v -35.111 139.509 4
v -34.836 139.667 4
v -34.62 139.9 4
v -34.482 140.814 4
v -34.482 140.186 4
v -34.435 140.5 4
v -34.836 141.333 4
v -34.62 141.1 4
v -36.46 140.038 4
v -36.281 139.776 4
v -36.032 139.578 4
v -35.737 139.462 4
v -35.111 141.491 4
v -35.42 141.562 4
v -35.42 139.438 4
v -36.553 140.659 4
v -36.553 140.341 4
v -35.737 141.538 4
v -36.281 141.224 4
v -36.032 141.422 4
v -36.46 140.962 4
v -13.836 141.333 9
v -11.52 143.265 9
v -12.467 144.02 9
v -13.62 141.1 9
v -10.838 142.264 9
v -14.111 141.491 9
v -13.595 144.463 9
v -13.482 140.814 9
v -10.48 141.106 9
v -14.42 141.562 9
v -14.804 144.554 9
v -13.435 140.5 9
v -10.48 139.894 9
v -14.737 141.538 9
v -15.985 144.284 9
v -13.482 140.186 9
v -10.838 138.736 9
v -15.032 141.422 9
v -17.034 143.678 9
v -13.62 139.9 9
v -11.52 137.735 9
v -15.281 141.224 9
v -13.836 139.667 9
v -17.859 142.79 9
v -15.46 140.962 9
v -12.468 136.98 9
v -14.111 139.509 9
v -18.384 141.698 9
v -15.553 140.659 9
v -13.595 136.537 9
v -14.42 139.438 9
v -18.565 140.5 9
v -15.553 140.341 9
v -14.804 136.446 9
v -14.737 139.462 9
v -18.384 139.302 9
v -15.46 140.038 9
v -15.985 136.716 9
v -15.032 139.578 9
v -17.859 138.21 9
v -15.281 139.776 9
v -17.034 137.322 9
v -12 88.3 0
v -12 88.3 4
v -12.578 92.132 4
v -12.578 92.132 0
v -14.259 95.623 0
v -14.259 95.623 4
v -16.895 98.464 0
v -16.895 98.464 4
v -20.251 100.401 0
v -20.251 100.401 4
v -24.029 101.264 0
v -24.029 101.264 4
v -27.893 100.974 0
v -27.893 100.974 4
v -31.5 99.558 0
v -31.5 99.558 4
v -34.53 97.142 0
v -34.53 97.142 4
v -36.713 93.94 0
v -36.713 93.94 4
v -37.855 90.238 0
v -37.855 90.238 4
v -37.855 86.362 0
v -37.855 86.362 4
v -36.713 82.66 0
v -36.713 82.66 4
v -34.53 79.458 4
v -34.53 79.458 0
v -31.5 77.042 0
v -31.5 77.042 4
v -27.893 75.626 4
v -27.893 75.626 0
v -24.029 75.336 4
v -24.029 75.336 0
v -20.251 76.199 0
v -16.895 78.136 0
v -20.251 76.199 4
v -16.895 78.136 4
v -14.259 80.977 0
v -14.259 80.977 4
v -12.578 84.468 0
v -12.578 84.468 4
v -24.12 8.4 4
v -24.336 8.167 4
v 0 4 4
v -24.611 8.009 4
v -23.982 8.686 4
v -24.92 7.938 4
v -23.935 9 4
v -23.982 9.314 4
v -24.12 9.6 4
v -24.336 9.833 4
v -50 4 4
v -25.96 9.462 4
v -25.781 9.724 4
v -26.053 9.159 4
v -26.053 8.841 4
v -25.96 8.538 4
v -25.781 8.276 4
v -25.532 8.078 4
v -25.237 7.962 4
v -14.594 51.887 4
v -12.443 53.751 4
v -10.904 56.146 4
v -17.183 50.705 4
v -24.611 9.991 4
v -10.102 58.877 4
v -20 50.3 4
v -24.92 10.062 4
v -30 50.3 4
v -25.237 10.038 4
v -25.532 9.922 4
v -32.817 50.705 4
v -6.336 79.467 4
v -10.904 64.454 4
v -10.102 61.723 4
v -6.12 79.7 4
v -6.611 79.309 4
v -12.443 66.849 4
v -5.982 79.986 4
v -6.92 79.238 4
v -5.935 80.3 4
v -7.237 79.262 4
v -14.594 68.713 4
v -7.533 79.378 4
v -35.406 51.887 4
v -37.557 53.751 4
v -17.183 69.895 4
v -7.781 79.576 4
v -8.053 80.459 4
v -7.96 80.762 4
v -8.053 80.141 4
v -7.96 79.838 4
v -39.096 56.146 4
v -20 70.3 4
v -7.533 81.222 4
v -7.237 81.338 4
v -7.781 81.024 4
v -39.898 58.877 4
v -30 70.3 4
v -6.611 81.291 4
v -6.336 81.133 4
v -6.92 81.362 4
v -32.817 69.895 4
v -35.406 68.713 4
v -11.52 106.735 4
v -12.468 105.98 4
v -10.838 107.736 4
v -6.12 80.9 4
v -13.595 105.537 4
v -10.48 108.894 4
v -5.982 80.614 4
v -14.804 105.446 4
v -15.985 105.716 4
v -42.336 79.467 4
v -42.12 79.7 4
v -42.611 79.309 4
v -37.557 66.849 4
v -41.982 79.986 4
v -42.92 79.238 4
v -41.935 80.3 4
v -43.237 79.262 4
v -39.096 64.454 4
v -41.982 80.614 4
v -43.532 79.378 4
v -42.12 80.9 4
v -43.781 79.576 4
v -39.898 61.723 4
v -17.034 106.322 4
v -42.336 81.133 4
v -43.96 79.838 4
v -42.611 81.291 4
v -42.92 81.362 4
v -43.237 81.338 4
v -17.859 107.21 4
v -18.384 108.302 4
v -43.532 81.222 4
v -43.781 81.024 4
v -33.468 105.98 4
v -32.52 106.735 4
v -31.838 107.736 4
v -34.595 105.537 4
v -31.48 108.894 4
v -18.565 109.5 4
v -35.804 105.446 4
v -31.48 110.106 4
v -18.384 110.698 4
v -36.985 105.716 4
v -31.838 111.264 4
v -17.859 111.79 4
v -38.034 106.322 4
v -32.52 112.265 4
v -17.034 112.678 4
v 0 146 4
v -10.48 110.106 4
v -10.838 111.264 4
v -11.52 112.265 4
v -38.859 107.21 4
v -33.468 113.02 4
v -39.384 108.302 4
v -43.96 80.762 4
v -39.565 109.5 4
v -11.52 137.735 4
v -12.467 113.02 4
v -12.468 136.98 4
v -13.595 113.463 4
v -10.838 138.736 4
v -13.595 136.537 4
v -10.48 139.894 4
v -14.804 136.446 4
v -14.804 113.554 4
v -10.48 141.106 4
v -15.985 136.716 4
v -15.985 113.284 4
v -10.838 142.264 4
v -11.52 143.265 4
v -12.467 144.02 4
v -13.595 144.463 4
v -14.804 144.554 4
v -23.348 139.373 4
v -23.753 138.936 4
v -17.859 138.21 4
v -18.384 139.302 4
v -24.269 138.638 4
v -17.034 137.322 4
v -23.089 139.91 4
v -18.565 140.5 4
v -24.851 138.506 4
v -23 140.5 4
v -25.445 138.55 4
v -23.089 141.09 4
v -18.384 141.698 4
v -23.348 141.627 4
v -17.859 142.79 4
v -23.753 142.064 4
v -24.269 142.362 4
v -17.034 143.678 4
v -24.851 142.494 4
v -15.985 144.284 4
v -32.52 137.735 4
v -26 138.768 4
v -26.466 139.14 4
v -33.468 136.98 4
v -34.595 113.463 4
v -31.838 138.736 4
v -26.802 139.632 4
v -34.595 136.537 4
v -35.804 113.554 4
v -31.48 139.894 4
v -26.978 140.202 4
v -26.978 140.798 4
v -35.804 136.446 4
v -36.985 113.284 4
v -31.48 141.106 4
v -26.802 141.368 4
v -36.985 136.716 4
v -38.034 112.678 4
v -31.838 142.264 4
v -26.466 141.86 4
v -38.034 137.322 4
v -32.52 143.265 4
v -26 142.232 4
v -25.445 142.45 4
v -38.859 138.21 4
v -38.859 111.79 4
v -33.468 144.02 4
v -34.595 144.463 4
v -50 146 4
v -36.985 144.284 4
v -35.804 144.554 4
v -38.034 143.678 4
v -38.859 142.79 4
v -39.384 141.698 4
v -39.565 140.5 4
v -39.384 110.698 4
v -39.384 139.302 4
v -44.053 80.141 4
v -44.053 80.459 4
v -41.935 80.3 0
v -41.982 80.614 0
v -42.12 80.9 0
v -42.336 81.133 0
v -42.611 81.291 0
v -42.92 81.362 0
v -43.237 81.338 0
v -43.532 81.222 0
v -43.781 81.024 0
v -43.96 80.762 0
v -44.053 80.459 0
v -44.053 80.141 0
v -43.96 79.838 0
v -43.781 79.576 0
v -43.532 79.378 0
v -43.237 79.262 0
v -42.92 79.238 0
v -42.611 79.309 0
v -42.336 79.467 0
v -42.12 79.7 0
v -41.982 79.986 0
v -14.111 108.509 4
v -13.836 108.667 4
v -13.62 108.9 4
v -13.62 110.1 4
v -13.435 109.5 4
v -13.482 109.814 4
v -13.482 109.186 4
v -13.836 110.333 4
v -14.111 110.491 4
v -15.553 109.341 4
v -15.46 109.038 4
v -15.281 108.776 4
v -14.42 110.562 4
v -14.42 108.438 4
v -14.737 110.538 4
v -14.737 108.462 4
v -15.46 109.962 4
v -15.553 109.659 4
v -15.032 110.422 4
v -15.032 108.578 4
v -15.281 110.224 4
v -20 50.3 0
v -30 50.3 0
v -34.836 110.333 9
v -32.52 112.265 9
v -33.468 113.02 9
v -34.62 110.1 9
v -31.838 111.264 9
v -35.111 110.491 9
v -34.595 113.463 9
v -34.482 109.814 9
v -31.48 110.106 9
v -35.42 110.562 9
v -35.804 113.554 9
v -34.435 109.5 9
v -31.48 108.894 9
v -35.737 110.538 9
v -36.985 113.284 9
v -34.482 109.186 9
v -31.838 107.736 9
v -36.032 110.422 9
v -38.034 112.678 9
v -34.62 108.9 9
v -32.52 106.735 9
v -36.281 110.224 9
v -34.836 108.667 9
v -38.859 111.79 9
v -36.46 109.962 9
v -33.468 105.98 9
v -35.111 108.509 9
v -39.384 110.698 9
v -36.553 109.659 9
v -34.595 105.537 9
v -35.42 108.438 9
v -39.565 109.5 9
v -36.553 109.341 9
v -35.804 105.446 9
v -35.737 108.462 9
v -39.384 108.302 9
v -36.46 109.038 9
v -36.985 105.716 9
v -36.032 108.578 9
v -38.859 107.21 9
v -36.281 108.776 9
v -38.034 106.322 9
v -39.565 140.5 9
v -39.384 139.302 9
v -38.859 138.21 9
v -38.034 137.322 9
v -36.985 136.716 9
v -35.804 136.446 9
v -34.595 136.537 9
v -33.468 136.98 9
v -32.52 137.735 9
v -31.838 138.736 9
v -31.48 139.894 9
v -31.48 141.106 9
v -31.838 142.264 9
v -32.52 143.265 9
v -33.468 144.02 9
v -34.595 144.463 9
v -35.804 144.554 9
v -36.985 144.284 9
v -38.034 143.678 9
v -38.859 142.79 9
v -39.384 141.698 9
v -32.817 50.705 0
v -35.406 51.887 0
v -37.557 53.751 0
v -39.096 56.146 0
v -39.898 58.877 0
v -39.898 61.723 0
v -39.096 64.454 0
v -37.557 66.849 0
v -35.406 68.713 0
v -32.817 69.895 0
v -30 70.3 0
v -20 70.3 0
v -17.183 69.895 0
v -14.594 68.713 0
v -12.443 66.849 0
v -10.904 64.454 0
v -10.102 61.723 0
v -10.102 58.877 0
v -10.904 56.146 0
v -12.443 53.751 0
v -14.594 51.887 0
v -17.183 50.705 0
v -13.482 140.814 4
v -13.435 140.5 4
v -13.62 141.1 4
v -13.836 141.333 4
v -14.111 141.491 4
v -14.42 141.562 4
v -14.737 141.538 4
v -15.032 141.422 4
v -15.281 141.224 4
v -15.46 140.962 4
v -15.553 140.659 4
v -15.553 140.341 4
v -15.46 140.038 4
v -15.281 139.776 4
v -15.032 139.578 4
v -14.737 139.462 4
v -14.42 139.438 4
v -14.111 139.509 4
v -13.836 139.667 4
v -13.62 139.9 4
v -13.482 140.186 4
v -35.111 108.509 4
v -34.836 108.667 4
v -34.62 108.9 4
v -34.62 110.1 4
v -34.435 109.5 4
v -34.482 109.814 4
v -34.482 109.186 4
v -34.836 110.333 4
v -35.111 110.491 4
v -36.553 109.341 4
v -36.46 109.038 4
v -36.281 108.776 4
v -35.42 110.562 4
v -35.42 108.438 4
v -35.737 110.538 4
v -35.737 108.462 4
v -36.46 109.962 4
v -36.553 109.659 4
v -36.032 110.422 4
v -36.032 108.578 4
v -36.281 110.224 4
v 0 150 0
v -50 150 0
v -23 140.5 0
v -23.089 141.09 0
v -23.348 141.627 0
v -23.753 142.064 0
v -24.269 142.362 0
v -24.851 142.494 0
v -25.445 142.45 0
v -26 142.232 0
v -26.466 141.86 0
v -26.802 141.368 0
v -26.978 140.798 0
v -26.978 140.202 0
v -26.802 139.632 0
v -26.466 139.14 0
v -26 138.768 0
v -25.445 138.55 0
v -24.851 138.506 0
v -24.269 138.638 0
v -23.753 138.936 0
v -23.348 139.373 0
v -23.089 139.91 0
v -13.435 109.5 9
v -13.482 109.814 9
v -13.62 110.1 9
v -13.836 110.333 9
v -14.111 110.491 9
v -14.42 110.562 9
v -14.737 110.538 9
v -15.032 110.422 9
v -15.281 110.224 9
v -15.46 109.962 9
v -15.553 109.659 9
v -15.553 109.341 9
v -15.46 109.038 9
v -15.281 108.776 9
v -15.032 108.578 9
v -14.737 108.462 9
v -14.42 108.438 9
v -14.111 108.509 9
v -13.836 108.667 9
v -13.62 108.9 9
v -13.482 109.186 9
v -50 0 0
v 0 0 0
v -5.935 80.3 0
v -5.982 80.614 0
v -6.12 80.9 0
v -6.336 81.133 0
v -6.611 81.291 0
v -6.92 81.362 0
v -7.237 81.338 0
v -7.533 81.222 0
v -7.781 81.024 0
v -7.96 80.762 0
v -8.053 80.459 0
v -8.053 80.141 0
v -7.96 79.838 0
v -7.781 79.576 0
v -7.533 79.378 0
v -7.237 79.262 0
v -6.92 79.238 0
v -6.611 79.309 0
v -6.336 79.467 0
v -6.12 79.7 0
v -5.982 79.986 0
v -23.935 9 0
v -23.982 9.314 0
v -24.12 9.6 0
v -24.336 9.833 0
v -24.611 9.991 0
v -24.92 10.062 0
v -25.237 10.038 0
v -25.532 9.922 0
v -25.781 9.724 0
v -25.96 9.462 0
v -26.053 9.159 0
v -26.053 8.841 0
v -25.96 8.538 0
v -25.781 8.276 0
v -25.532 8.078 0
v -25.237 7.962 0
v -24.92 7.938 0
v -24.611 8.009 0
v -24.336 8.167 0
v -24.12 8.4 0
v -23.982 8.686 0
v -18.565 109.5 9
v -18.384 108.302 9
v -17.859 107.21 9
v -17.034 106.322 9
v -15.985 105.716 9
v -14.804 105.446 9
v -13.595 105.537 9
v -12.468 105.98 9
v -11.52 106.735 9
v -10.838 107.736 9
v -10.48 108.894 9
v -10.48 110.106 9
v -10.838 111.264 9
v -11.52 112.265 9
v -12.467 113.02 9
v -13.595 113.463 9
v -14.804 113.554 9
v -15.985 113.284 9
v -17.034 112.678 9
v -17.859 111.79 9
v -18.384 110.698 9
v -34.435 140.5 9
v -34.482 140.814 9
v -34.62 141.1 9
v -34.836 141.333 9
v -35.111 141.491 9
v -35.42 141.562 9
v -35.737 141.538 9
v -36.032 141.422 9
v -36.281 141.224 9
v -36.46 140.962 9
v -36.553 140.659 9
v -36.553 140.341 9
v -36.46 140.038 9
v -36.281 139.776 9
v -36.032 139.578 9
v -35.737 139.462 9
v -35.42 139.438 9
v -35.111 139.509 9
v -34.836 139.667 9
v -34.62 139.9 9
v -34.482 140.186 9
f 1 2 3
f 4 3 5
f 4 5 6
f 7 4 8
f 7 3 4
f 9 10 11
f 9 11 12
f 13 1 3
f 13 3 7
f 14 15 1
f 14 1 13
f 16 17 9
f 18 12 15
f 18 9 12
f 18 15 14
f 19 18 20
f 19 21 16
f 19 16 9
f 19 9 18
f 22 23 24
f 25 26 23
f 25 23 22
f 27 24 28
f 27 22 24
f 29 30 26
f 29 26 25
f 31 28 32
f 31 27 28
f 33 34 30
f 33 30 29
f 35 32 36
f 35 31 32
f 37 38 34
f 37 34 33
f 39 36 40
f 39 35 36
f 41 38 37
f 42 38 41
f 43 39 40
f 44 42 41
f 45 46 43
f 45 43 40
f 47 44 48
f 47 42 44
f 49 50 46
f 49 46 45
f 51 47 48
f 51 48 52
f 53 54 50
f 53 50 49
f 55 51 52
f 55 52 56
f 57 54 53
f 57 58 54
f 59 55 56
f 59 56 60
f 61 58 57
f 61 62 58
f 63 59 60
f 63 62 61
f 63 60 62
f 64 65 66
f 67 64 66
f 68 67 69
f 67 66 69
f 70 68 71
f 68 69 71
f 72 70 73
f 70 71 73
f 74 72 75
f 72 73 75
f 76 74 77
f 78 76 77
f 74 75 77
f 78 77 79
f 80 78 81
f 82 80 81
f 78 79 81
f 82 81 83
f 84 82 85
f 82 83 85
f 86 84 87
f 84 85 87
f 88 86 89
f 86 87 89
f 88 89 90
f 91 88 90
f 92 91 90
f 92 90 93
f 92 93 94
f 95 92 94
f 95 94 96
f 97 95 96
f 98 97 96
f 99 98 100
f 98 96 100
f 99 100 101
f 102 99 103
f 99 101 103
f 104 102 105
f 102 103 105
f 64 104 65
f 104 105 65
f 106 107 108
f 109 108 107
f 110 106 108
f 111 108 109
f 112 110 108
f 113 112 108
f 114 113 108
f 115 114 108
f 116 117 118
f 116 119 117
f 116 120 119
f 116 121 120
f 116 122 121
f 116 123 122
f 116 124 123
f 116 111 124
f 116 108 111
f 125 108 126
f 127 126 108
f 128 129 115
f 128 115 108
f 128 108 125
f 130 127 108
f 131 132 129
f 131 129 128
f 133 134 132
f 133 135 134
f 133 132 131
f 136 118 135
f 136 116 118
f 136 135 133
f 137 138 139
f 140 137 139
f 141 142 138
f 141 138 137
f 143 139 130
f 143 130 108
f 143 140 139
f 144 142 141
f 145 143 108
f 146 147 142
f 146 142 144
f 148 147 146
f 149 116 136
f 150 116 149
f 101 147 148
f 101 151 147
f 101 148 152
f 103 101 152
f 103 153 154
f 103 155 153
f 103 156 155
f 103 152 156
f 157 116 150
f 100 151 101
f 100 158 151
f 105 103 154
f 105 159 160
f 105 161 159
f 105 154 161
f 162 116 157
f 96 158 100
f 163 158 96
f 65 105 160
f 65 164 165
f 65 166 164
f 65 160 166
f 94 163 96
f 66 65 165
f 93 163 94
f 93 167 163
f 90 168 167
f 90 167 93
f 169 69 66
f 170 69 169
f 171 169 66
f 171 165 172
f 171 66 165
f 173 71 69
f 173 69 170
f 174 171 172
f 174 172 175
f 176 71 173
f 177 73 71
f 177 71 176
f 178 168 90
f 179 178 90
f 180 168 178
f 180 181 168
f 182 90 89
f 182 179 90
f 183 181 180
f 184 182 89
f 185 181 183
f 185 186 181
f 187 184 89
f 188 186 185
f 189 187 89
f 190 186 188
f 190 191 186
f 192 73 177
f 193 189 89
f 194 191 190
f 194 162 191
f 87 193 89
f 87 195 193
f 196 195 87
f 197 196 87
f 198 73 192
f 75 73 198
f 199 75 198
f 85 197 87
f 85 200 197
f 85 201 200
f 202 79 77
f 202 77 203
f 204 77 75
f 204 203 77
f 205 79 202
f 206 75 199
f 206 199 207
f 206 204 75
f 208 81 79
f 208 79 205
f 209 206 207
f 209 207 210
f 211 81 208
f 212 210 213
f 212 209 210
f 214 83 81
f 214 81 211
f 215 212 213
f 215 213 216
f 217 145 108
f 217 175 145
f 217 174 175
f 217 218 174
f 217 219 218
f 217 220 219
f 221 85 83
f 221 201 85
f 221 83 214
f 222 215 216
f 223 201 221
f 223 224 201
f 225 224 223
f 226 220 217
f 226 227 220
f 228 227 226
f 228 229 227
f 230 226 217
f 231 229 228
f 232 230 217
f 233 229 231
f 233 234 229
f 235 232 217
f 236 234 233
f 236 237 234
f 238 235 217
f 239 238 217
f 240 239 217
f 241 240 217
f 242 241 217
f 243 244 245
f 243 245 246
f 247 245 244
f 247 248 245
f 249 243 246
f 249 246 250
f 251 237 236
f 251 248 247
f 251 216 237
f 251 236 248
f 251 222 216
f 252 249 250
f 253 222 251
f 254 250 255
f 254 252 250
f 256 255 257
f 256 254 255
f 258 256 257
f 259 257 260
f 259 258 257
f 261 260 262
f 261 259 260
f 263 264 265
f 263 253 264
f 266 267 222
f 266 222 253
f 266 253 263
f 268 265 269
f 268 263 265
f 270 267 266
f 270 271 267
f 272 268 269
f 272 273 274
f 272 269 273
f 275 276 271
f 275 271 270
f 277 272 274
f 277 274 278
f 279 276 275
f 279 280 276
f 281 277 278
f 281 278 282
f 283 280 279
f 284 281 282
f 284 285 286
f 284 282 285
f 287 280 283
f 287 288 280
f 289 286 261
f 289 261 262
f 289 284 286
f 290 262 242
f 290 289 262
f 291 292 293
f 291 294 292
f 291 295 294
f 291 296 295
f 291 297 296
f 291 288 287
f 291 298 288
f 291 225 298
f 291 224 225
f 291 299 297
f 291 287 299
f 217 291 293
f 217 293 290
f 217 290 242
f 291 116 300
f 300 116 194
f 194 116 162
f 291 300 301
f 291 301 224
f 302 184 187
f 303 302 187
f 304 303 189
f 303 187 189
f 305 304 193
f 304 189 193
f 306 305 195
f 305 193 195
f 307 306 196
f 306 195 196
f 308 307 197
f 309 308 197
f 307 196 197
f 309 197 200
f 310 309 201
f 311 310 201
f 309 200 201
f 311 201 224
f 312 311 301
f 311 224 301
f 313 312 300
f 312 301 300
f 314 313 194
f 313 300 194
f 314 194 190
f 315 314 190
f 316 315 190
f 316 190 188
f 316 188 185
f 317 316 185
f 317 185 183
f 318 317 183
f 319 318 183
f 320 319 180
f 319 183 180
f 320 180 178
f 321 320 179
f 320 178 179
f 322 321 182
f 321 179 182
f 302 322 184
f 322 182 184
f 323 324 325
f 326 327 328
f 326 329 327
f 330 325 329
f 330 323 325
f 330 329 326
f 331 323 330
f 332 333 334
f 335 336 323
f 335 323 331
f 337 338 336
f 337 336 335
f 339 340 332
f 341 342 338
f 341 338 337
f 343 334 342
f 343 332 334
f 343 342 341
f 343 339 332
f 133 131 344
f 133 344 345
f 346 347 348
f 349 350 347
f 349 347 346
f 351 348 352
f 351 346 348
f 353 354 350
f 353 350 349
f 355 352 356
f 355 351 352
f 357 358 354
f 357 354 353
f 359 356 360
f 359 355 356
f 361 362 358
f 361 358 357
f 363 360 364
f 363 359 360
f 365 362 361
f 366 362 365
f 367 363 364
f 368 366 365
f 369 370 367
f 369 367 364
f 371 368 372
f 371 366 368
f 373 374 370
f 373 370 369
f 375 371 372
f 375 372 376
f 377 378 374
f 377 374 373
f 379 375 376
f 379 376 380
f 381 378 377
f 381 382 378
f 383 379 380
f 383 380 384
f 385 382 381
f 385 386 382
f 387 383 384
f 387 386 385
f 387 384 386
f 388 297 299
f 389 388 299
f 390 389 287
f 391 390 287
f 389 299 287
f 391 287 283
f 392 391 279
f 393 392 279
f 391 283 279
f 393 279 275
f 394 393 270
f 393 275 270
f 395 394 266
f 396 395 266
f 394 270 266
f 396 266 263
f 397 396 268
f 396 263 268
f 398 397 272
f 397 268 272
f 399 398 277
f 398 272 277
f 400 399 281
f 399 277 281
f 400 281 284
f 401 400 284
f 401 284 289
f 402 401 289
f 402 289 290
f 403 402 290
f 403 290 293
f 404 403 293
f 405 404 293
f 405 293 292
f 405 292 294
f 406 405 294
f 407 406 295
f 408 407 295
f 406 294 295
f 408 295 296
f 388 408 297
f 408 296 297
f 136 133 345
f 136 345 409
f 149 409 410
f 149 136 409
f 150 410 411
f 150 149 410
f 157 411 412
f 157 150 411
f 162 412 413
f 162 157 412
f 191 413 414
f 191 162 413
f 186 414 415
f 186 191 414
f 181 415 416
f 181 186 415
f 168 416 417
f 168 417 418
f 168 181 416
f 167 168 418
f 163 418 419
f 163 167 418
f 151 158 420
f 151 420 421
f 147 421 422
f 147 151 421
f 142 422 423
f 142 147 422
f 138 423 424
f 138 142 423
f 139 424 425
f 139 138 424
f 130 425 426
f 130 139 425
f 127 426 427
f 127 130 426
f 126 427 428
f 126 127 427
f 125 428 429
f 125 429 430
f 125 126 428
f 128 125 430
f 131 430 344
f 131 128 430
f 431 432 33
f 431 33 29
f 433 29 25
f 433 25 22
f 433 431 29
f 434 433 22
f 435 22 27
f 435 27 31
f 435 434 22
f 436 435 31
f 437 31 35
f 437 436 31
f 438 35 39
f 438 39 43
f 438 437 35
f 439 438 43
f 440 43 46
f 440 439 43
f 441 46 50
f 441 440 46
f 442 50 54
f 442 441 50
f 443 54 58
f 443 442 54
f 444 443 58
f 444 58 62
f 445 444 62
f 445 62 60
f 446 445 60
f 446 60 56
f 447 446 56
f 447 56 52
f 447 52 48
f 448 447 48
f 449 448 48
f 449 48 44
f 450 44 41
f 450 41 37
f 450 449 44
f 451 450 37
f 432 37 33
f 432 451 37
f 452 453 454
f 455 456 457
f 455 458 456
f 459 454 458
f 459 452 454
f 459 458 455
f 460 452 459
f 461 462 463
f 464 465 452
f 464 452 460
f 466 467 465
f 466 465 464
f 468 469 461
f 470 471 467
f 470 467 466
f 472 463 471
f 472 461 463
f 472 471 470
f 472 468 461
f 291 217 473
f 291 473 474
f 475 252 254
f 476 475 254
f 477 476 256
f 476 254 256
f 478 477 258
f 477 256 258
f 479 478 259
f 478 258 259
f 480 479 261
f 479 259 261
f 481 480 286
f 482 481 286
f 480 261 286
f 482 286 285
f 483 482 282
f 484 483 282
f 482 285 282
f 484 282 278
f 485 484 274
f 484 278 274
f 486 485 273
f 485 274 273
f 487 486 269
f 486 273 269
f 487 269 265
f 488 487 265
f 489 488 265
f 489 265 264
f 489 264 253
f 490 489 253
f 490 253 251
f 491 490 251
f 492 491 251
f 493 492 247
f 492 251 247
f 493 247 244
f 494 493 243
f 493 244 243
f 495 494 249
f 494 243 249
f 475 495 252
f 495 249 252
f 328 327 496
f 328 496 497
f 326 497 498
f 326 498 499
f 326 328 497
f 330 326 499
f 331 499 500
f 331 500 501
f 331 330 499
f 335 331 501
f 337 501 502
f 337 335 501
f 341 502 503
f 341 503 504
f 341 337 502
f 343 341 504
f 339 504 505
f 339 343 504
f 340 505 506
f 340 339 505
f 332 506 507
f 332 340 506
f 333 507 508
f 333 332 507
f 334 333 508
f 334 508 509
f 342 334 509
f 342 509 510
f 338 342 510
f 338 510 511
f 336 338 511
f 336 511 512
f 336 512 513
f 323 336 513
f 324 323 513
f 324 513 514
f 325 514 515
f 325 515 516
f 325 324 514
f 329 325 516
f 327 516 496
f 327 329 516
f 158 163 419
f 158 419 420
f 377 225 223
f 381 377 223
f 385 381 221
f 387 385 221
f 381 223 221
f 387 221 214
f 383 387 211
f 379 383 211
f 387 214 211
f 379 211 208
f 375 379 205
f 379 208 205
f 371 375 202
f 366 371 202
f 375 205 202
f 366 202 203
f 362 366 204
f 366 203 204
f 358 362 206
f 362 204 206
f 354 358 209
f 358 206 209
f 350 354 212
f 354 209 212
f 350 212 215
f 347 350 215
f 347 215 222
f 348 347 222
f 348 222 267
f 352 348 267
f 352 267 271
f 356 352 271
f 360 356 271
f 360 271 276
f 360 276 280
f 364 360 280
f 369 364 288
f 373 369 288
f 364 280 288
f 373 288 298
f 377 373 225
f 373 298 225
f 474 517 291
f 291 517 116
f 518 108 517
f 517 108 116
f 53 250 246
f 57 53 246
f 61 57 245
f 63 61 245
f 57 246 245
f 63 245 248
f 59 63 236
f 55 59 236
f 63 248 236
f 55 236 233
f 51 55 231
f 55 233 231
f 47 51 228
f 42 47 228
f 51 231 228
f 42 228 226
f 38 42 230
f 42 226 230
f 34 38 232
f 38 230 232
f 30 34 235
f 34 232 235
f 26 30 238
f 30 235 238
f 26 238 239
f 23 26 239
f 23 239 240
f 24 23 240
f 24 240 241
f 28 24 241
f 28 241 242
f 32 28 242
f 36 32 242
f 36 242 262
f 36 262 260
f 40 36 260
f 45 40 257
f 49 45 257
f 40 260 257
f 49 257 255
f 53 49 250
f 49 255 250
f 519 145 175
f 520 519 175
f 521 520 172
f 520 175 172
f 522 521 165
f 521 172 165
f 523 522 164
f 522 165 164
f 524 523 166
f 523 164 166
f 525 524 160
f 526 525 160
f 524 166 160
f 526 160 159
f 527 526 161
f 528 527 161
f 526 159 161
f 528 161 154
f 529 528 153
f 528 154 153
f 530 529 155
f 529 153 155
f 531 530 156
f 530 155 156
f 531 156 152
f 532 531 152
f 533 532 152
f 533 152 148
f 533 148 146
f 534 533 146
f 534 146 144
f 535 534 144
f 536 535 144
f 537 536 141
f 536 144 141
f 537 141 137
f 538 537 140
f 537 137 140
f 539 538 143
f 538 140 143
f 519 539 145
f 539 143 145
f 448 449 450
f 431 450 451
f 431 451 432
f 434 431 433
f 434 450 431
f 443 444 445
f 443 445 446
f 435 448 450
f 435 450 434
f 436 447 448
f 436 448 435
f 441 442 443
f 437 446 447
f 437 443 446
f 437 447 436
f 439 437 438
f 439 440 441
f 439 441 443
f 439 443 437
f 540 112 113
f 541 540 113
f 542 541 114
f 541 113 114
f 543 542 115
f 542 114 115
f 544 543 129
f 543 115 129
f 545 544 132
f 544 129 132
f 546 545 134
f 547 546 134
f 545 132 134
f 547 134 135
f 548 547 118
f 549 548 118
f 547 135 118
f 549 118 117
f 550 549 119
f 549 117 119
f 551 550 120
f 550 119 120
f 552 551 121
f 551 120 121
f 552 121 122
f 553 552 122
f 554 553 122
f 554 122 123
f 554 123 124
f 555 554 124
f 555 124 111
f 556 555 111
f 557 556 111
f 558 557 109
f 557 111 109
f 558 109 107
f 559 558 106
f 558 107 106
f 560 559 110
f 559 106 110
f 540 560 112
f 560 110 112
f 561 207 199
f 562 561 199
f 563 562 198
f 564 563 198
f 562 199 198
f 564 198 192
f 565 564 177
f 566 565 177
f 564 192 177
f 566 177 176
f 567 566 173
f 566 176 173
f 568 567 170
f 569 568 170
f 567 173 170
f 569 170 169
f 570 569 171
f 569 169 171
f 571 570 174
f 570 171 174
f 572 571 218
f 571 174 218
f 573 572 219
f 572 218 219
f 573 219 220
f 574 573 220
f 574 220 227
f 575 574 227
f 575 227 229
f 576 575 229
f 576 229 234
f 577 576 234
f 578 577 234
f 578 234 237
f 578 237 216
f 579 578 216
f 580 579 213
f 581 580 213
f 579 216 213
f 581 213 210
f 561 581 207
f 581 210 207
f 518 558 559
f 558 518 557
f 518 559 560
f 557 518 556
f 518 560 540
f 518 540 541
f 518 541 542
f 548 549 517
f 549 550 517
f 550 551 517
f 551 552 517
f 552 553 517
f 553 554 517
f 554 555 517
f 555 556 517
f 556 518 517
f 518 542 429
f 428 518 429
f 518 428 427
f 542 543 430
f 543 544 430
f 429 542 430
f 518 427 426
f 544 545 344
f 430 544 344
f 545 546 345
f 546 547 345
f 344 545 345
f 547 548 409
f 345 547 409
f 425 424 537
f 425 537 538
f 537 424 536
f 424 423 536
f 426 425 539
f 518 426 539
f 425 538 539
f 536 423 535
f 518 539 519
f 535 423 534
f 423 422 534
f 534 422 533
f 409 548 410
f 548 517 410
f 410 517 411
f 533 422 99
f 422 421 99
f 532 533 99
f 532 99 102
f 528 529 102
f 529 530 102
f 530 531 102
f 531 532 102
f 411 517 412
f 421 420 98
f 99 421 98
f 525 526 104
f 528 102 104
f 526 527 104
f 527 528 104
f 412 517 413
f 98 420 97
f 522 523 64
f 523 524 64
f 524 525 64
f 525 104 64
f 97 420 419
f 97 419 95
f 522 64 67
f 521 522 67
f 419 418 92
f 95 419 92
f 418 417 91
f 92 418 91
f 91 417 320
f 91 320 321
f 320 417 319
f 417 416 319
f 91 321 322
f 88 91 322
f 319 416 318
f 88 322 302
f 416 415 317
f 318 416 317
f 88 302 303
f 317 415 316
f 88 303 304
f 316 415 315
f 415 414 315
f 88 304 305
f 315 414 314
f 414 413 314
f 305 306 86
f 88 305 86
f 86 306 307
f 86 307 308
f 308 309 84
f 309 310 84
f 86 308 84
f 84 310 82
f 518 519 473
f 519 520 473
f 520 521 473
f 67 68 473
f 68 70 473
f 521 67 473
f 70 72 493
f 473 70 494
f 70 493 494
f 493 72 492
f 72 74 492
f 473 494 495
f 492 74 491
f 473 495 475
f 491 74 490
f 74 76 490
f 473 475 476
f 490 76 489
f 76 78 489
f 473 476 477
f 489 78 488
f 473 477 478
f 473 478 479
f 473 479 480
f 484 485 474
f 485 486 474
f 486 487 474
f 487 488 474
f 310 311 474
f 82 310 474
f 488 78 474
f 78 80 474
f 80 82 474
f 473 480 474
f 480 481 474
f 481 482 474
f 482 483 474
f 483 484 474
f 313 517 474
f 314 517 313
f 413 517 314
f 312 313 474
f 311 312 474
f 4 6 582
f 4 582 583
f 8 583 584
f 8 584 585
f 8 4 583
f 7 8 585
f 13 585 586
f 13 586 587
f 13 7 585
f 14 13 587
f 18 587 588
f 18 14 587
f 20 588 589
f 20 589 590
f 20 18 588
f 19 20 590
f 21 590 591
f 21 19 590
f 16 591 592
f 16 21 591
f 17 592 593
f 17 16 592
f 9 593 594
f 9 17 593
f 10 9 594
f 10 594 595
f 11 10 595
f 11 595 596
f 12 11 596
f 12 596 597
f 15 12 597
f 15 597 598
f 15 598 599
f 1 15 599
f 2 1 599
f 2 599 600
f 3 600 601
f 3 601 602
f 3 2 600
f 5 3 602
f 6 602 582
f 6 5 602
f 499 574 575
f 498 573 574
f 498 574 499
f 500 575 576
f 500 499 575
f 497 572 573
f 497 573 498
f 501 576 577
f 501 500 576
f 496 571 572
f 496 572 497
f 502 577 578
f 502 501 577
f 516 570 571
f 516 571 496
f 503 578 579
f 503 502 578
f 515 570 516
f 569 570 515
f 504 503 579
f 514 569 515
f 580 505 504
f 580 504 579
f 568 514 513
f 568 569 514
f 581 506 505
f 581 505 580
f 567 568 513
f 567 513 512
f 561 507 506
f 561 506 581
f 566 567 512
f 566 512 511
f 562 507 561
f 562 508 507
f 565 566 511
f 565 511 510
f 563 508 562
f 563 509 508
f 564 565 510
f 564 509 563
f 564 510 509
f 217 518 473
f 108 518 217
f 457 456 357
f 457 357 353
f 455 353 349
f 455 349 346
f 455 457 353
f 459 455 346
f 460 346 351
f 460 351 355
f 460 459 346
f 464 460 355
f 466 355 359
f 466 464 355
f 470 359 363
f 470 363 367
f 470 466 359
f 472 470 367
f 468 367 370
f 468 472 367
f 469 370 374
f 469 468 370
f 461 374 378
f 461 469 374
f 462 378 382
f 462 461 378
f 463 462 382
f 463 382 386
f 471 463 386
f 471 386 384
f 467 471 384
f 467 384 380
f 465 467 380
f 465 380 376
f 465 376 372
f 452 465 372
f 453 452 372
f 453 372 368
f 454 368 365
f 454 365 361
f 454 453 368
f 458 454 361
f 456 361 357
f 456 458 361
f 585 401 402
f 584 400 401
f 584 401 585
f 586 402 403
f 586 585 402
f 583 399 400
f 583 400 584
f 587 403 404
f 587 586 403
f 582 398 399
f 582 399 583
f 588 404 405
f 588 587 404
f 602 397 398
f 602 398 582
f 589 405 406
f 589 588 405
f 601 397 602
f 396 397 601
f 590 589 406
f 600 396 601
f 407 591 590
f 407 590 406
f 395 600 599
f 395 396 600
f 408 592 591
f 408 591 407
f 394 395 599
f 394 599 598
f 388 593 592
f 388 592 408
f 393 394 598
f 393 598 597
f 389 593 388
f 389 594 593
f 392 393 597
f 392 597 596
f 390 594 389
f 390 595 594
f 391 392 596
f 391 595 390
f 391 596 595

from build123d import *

# Parameters (mm, degrees)
SKETCH1_W           = 150
SKETCH1_H           = 50
BOSS_EXTRUDE1_DEPTH = 4
CHAMFER1_SIZE       = 4
SKETCH2_R           = 13
SKETCH2_R_2         = 1.065
SKETCH2_R_3         = 2
CUT_EXTRUDE2_DEPTH  = 4
SKETCH6_R           = 4.065
SKETCH6_R_2         = 1.065
BOSS_EXTRUDE2_DEPTH = 5


with BuildPart() as part:
    # Sketch1 → Boss-Extrude1 (new body)
    with BuildSketch(Plane(origin=(0, 0, 0), x_dir=(0, 1, 0), z_dir=(0, 0, 1))):
        with Locations((75, 25)):
            Rectangle(SKETCH1_W, SKETCH1_H)
    extrude(amount=BOSS_EXTRUDE1_DEPTH)

    # Chamfer1
    chamfer1_edges = [part.edges().sort_by_distance(p)[0] for p in [
        (-25, 150, 4),
        (-25, 0, 4),
    ]]
    chamfer(chamfer1_edges, length=CHAMFER1_SIZE - 0.0001)  # a hair under: the kernel refuses the full size

    # Sketch2 → Cut-Extrude2 (cut)
    with BuildSketch(Plane.XY.offset(4)):
        with Locations((-25, 88.3)):
            Circle(SKETCH2_R)
        with Locations((-25, 9)):
            Circle(SKETCH2_R_2)
        with Locations((-7, 80.3)):
            Circle(SKETCH2_R_2)
        with Locations((-43, 80.3)):
            Circle(SKETCH2_R_2)
        with Locations((-25, 140.5)):
            Circle(SKETCH2_R_3)
        with BuildLine():
            Line((-30, 70.3), (-20, 70.3))
            ThreePointArc((-20, 70.3), (-10, 60.3), (-20, 50.3))
            Line((-20, 50.3), (-30, 50.3))
            ThreePointArc((-30, 50.3), (-40, 60.3), (-30, 70.3))
        make_face()
    extrude(amount=-CUT_EXTRUDE2_DEPTH, mode=Mode.SUBTRACT)

    # Sketch6 → Boss-Extrude2 (add)
    # profile 1 of 4: a face of its own
    with BuildSketch(Plane.XY.offset(4)):
        with Locations(Location((-35.5, 140.5, 0), (0, 0, 180))):
            Circle(SKETCH6_R)
        with Locations((-35.5, 140.5)):
            Circle(SKETCH6_R_2, mode=Mode.SUBTRACT)
    # profile 2 of 4: a face of its own
    with BuildSketch(Plane.XY.offset(4)):
        with Locations(Location((-14.5, 140.5, 0), (0, 0, 180))):
            Circle(SKETCH6_R)
        with Locations((-14.5, 140.5)):
            Circle(SKETCH6_R_2, mode=Mode.SUBTRACT)
    # profile 3 of 4: a face of its own
    with BuildSketch(Plane.XY.offset(4)):
        with Locations(Location((-14.5, 109.5, 0), (0, 0, 180))):
            Circle(SKETCH6_R)
        with Locations((-14.5, 109.5)):
            Circle(SKETCH6_R_2, mode=Mode.SUBTRACT)
    # profile 4 of 4: a face of its own
    with BuildSketch(Plane.XY.offset(4)):
        with Locations(Location((-35.5, 109.5, 0), (0, 0, 180))):
            Circle(SKETCH6_R)
        with Locations((-35.5, 109.5)):
            Circle(SKETCH6_R_2, mode=Mode.SUBTRACT)
    extrude(amount=BOSS_EXTRUDE2_DEPTH)


solid = part.part
